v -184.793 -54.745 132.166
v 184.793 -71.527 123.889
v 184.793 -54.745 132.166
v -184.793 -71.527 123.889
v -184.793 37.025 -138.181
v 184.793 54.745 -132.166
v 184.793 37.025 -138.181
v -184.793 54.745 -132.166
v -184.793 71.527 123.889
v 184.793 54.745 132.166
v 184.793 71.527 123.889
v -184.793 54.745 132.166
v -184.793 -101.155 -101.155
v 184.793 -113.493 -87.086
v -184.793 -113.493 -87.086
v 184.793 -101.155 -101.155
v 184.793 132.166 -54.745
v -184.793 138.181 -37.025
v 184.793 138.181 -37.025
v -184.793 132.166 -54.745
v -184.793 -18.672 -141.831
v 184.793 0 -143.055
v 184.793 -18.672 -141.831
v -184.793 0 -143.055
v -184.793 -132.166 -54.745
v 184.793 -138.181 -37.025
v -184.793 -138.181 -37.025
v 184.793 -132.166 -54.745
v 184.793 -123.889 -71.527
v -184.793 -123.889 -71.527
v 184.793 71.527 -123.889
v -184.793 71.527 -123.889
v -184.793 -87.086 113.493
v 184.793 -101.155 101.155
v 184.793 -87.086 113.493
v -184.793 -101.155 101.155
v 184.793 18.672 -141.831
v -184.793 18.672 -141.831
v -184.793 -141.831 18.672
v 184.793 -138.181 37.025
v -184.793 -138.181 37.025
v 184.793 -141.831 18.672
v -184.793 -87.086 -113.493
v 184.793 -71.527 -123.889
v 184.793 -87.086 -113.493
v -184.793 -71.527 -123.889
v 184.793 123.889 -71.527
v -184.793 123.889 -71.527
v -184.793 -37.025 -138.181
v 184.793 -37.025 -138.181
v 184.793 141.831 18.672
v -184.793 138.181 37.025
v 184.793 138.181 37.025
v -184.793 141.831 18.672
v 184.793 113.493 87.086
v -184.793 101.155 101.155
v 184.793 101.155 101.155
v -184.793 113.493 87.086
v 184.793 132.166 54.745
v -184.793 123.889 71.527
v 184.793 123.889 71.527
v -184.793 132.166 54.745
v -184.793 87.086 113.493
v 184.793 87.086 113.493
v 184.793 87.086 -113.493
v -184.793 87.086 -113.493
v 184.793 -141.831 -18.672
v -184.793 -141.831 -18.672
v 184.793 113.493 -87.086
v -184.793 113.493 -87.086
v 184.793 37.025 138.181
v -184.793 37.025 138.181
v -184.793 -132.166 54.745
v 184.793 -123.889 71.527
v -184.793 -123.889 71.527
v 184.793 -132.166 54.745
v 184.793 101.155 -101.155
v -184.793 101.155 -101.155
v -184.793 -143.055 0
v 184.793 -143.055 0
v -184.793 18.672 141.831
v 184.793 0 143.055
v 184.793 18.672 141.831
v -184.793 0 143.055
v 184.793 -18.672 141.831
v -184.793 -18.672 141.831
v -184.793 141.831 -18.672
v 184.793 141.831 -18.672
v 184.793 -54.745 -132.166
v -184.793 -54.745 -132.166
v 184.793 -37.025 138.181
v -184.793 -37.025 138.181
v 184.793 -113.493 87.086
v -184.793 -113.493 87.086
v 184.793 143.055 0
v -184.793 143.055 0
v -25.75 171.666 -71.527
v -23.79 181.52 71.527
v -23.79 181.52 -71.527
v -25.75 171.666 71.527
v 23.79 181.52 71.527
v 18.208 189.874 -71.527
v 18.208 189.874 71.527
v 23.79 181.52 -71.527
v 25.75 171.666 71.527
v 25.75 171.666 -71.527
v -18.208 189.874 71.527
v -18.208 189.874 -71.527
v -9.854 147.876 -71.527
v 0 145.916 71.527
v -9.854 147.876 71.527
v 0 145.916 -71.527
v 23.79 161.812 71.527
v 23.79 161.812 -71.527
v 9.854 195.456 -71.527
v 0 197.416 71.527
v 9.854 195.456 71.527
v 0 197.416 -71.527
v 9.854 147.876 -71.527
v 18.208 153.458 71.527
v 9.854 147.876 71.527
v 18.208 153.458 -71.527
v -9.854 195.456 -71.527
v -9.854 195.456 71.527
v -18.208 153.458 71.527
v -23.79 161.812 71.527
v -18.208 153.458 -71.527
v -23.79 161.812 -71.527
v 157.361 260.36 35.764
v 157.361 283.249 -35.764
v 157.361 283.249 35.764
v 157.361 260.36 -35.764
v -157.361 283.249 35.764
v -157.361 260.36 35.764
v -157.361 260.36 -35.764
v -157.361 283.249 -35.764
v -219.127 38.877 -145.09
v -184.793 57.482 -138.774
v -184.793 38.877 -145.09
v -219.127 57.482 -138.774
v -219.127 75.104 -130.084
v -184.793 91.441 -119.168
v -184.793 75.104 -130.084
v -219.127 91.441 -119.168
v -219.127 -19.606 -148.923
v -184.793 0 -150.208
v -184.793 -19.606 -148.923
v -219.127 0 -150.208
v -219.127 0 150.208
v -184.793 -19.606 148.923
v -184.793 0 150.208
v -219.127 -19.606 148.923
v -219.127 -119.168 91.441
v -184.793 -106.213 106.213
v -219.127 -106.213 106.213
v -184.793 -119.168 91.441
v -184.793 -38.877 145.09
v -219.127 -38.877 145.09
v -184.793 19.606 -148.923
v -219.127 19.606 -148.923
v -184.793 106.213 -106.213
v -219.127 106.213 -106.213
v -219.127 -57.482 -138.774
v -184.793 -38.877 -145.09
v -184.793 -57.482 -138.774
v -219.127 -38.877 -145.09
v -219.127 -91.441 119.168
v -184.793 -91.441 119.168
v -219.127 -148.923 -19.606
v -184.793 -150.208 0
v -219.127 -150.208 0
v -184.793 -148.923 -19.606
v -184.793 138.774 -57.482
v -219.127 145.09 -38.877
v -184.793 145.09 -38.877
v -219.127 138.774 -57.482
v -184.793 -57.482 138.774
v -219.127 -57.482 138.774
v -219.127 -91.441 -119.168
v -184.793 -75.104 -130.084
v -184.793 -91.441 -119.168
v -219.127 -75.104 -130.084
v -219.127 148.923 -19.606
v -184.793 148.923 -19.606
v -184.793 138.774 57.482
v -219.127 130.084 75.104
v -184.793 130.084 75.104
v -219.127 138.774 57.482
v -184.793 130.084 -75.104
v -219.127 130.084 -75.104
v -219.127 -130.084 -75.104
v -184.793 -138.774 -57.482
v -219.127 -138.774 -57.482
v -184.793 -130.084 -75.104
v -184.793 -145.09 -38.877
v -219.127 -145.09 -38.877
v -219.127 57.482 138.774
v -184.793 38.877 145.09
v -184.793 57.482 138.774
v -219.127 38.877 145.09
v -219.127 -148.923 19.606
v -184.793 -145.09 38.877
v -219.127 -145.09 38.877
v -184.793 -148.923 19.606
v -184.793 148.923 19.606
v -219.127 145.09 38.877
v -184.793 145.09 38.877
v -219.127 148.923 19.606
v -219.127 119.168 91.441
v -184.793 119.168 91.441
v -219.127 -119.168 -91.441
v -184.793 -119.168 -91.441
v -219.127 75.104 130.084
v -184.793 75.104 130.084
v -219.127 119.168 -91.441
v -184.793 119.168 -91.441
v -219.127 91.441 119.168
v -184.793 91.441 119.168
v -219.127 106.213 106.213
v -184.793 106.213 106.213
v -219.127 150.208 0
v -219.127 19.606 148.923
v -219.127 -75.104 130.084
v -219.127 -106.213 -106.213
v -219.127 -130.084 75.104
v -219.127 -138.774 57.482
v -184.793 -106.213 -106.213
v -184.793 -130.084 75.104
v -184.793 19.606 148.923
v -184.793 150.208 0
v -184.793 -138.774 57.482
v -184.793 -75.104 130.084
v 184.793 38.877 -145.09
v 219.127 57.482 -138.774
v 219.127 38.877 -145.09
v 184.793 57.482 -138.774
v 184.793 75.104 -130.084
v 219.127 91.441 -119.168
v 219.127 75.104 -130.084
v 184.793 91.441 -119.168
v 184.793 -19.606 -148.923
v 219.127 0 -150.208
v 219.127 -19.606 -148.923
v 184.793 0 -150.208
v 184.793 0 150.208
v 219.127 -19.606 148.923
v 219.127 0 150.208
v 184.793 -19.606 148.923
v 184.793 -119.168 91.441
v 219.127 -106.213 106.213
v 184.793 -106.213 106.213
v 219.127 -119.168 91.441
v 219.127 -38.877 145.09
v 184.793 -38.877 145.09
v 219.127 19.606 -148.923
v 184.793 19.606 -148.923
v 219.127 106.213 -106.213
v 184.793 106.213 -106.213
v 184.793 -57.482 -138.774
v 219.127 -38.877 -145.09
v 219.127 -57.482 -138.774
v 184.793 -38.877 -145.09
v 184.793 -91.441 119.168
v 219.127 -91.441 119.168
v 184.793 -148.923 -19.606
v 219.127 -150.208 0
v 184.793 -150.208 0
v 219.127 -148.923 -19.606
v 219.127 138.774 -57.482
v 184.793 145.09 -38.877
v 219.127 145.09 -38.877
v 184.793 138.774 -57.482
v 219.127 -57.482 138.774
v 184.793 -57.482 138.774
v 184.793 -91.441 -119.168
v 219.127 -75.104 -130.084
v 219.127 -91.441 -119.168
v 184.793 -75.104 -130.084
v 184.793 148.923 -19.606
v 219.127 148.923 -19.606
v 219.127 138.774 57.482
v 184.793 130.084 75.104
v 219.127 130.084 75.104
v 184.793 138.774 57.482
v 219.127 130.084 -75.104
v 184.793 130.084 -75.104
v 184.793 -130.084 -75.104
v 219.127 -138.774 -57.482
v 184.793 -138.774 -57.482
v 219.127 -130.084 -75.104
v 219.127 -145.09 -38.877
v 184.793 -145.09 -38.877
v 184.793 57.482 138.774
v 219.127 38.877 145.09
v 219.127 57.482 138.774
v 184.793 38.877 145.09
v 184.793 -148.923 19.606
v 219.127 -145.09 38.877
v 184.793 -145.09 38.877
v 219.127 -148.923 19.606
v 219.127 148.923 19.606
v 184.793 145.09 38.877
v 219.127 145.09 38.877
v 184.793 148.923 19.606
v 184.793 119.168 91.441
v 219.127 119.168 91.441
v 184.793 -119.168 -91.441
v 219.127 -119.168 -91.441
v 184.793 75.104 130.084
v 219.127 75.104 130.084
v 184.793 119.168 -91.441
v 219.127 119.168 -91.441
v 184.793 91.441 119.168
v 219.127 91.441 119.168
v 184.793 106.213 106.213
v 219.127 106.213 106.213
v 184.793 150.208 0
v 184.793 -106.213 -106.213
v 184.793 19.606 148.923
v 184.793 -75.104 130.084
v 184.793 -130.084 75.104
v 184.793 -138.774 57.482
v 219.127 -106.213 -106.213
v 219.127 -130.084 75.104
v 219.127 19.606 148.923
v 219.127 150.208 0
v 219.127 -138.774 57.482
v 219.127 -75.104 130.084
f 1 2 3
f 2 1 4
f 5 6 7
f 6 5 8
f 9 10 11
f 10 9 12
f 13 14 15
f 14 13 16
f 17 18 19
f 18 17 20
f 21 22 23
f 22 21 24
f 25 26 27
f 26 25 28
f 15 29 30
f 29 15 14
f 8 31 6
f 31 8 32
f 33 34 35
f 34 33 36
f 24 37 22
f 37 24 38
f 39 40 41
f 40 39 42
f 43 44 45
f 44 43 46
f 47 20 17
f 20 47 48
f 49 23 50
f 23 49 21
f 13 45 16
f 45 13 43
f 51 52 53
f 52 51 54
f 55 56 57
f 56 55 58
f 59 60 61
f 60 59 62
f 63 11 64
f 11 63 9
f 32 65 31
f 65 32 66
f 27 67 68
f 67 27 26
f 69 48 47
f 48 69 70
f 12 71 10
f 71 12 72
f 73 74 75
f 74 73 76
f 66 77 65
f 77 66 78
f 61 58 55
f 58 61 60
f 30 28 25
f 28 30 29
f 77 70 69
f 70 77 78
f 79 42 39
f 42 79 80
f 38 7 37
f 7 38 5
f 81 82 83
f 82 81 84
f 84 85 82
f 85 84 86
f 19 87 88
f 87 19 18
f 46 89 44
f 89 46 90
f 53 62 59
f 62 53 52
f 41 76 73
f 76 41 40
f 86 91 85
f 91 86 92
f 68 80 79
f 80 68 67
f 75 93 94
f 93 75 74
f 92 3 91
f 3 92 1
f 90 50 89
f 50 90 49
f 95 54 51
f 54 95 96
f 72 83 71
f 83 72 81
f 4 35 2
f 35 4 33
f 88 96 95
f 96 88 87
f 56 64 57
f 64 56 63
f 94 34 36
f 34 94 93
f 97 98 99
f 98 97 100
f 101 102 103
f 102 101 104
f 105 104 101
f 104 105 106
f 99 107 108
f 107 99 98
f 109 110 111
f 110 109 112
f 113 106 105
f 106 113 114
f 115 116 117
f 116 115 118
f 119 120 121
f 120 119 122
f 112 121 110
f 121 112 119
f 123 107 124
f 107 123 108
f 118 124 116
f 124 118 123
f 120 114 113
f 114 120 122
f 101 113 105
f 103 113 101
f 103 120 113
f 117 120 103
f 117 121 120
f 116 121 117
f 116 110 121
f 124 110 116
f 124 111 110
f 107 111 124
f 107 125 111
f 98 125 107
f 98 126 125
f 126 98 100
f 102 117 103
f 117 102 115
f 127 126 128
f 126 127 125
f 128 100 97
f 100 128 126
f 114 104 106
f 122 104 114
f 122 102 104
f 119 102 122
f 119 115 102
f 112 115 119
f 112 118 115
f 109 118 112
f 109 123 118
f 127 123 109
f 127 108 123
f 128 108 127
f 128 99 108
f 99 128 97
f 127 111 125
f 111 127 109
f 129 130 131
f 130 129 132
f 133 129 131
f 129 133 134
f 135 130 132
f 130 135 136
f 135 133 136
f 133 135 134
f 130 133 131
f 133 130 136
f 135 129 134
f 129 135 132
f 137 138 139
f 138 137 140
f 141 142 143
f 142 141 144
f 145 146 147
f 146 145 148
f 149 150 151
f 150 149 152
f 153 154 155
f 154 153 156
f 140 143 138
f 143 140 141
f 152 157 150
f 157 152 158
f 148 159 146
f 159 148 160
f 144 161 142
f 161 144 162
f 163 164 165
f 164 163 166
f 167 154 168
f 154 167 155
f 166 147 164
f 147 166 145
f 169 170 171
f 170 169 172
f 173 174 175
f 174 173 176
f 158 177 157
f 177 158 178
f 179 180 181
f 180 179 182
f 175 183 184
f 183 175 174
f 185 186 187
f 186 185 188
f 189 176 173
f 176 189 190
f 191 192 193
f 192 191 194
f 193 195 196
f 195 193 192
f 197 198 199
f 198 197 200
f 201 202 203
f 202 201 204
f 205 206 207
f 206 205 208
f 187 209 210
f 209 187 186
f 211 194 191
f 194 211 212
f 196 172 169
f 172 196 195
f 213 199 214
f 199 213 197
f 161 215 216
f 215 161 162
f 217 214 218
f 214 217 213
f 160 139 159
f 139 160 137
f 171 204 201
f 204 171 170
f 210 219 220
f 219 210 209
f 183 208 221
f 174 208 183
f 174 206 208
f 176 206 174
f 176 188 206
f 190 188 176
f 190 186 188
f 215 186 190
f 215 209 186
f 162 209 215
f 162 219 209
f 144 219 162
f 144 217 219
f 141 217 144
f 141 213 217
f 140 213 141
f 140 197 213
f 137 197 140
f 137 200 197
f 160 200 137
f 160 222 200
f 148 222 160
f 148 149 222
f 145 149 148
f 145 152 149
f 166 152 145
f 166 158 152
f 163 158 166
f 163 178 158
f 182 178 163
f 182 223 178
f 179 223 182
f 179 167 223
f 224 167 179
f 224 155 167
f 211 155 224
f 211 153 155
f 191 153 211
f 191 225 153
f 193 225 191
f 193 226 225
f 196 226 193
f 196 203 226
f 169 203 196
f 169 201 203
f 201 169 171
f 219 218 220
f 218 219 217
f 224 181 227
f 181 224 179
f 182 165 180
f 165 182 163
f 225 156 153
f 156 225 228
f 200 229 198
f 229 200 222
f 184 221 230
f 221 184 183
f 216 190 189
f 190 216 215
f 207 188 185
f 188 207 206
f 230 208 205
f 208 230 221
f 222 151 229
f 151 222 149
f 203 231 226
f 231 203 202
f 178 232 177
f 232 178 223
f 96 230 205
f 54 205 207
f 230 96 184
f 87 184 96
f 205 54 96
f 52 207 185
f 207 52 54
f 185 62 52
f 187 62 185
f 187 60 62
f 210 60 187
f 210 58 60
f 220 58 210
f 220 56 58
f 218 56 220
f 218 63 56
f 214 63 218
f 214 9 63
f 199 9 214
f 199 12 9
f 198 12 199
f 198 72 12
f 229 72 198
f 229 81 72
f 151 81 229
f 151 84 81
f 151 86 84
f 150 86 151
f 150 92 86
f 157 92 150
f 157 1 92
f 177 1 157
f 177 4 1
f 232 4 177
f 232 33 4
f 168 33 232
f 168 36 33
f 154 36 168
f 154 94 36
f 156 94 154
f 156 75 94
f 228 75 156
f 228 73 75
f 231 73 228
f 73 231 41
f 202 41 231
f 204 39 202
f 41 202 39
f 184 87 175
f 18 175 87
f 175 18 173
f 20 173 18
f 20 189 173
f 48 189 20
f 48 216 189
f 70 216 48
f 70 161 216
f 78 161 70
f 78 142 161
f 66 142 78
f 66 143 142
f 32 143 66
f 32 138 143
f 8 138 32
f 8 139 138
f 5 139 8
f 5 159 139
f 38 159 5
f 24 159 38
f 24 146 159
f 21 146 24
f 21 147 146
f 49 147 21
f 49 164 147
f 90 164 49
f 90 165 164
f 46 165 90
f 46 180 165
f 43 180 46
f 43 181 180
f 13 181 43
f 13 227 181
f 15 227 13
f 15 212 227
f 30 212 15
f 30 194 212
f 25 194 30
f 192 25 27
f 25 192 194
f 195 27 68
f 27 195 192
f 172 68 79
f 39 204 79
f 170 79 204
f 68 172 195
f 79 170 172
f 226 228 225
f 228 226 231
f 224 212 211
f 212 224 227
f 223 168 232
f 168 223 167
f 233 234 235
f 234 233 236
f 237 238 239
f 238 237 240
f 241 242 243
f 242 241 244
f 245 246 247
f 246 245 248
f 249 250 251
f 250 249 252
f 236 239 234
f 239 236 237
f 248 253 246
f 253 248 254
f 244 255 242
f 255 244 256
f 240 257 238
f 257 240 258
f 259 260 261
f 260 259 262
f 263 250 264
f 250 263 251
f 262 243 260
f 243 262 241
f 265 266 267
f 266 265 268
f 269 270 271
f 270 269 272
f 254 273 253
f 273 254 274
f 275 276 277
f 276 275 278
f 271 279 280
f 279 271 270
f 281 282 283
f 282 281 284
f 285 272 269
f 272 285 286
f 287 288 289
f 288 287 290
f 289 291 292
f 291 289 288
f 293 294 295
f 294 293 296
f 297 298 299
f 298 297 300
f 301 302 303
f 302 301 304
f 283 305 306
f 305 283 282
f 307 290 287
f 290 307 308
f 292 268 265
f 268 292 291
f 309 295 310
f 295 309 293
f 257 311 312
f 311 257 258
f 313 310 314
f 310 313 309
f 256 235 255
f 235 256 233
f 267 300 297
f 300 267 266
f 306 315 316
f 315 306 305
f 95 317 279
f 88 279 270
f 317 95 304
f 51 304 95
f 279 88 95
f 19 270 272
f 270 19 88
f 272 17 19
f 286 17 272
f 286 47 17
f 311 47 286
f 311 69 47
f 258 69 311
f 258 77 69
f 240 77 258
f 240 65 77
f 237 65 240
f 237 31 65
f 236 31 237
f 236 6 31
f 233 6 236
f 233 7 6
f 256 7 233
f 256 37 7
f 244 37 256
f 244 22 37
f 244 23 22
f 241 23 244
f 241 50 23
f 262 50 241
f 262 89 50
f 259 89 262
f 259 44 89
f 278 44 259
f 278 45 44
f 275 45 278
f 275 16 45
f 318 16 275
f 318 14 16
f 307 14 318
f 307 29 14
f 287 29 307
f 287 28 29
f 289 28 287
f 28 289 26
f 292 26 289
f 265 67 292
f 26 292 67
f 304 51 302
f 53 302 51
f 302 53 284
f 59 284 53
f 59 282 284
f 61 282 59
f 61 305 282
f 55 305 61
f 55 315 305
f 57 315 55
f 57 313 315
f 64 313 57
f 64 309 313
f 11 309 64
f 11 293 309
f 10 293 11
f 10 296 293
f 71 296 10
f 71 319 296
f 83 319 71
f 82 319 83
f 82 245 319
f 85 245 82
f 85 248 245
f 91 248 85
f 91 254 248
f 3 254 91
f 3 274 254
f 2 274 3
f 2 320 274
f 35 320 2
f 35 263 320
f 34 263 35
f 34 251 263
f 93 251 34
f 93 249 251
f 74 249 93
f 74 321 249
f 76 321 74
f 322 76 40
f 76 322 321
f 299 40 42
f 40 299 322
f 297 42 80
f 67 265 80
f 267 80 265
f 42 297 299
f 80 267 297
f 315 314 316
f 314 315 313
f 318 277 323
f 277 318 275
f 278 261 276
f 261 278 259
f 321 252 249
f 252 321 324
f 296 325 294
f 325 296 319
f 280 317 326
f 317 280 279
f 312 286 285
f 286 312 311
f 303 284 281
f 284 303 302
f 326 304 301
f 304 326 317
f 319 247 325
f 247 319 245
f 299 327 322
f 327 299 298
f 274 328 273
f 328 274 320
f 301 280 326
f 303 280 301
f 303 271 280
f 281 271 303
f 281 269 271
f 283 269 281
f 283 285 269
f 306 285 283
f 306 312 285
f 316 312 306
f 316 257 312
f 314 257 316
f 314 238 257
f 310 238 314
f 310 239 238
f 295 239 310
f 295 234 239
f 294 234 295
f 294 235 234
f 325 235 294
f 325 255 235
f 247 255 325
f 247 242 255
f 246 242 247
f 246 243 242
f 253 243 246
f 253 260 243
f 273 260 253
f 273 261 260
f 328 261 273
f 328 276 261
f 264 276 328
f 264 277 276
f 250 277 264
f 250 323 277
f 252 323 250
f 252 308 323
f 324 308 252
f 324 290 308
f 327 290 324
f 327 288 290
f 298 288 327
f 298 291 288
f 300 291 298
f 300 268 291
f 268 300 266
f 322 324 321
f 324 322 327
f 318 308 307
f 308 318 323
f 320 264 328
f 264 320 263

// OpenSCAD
// Auto-generated by scripts/author_from_manifest.py (Phase D.3).
// Source: data/phase_d_manifest.json (sku_intent='reliable-model-dv-deluge-6in').
// Do not hand-edit — regenerate from the manifest.
//
// @part reliable_model_dv_deluge_6in
// @kind valve
// @category valve.deluge
// @display-name "Reliable Model DV Deluge Valve 6\""
// @mfg reliable_automatic_sprinkler
// @mfg-pn Model_DV
// @listing UL FM
// @price-usd 1580.00
// @install-minutes 75
// @crew foreman
// @param size_in number default=6 label="Size" unit="in"
// @port inlet position=[-0.05,0,0] direction=[-1,0,0] style=grooved size_in=6 role=run_a
// @port outlet position=[0.05,0,0] direction=[1,0,0] style=grooved size_in=6 role=run_b

size_in = 6.0;

function od_mm(nps) =
    nps ==   1  ? 33.4 :
    nps == 1.25 ? 42.2 :
    nps == 1.5  ? 48.3 :
    nps ==   2  ? 60.3 :
    nps == 2.5  ? 73.0 :
    nps ==   3  ? 88.9 :
    nps ==   4  ? 114.3 :
    nps ==   6  ? 168.3 :
    nps ==   8  ? 219.1 : 73.0;

od = od_mm(size_in);
body_len = od * 2.4;
body_d   = od * 1.7;

union() {
    // Valve body
    rotate([0, 90, 0])
        cylinder(h = body_len, d = body_d, center = true, $fn = 48);
    // Stem / handle indicator
    translate([0, body_d * 0.6, 0])
        cylinder(h = body_d * 0.5, d = body_d * 0.18, center = true, $fn = 16);
    translate([0, body_d * 0.95, 0])
        cube([body_d * 1.1, body_d * 0.08, body_d * 0.25], center = true);
    // End flanges
    translate([-body_len/2, 0, 0])
        rotate([0, 90, 0])
        cylinder(h = body_d * 0.12, d = body_d * 1.05, center = true, $fn = 48);
    translate([ body_len/2, 0, 0])
        rotate([0, 90, 0])
        cylinder(h = body_d * 0.12, d = body_d * 1.05, center = true, $fn = 48);
}
